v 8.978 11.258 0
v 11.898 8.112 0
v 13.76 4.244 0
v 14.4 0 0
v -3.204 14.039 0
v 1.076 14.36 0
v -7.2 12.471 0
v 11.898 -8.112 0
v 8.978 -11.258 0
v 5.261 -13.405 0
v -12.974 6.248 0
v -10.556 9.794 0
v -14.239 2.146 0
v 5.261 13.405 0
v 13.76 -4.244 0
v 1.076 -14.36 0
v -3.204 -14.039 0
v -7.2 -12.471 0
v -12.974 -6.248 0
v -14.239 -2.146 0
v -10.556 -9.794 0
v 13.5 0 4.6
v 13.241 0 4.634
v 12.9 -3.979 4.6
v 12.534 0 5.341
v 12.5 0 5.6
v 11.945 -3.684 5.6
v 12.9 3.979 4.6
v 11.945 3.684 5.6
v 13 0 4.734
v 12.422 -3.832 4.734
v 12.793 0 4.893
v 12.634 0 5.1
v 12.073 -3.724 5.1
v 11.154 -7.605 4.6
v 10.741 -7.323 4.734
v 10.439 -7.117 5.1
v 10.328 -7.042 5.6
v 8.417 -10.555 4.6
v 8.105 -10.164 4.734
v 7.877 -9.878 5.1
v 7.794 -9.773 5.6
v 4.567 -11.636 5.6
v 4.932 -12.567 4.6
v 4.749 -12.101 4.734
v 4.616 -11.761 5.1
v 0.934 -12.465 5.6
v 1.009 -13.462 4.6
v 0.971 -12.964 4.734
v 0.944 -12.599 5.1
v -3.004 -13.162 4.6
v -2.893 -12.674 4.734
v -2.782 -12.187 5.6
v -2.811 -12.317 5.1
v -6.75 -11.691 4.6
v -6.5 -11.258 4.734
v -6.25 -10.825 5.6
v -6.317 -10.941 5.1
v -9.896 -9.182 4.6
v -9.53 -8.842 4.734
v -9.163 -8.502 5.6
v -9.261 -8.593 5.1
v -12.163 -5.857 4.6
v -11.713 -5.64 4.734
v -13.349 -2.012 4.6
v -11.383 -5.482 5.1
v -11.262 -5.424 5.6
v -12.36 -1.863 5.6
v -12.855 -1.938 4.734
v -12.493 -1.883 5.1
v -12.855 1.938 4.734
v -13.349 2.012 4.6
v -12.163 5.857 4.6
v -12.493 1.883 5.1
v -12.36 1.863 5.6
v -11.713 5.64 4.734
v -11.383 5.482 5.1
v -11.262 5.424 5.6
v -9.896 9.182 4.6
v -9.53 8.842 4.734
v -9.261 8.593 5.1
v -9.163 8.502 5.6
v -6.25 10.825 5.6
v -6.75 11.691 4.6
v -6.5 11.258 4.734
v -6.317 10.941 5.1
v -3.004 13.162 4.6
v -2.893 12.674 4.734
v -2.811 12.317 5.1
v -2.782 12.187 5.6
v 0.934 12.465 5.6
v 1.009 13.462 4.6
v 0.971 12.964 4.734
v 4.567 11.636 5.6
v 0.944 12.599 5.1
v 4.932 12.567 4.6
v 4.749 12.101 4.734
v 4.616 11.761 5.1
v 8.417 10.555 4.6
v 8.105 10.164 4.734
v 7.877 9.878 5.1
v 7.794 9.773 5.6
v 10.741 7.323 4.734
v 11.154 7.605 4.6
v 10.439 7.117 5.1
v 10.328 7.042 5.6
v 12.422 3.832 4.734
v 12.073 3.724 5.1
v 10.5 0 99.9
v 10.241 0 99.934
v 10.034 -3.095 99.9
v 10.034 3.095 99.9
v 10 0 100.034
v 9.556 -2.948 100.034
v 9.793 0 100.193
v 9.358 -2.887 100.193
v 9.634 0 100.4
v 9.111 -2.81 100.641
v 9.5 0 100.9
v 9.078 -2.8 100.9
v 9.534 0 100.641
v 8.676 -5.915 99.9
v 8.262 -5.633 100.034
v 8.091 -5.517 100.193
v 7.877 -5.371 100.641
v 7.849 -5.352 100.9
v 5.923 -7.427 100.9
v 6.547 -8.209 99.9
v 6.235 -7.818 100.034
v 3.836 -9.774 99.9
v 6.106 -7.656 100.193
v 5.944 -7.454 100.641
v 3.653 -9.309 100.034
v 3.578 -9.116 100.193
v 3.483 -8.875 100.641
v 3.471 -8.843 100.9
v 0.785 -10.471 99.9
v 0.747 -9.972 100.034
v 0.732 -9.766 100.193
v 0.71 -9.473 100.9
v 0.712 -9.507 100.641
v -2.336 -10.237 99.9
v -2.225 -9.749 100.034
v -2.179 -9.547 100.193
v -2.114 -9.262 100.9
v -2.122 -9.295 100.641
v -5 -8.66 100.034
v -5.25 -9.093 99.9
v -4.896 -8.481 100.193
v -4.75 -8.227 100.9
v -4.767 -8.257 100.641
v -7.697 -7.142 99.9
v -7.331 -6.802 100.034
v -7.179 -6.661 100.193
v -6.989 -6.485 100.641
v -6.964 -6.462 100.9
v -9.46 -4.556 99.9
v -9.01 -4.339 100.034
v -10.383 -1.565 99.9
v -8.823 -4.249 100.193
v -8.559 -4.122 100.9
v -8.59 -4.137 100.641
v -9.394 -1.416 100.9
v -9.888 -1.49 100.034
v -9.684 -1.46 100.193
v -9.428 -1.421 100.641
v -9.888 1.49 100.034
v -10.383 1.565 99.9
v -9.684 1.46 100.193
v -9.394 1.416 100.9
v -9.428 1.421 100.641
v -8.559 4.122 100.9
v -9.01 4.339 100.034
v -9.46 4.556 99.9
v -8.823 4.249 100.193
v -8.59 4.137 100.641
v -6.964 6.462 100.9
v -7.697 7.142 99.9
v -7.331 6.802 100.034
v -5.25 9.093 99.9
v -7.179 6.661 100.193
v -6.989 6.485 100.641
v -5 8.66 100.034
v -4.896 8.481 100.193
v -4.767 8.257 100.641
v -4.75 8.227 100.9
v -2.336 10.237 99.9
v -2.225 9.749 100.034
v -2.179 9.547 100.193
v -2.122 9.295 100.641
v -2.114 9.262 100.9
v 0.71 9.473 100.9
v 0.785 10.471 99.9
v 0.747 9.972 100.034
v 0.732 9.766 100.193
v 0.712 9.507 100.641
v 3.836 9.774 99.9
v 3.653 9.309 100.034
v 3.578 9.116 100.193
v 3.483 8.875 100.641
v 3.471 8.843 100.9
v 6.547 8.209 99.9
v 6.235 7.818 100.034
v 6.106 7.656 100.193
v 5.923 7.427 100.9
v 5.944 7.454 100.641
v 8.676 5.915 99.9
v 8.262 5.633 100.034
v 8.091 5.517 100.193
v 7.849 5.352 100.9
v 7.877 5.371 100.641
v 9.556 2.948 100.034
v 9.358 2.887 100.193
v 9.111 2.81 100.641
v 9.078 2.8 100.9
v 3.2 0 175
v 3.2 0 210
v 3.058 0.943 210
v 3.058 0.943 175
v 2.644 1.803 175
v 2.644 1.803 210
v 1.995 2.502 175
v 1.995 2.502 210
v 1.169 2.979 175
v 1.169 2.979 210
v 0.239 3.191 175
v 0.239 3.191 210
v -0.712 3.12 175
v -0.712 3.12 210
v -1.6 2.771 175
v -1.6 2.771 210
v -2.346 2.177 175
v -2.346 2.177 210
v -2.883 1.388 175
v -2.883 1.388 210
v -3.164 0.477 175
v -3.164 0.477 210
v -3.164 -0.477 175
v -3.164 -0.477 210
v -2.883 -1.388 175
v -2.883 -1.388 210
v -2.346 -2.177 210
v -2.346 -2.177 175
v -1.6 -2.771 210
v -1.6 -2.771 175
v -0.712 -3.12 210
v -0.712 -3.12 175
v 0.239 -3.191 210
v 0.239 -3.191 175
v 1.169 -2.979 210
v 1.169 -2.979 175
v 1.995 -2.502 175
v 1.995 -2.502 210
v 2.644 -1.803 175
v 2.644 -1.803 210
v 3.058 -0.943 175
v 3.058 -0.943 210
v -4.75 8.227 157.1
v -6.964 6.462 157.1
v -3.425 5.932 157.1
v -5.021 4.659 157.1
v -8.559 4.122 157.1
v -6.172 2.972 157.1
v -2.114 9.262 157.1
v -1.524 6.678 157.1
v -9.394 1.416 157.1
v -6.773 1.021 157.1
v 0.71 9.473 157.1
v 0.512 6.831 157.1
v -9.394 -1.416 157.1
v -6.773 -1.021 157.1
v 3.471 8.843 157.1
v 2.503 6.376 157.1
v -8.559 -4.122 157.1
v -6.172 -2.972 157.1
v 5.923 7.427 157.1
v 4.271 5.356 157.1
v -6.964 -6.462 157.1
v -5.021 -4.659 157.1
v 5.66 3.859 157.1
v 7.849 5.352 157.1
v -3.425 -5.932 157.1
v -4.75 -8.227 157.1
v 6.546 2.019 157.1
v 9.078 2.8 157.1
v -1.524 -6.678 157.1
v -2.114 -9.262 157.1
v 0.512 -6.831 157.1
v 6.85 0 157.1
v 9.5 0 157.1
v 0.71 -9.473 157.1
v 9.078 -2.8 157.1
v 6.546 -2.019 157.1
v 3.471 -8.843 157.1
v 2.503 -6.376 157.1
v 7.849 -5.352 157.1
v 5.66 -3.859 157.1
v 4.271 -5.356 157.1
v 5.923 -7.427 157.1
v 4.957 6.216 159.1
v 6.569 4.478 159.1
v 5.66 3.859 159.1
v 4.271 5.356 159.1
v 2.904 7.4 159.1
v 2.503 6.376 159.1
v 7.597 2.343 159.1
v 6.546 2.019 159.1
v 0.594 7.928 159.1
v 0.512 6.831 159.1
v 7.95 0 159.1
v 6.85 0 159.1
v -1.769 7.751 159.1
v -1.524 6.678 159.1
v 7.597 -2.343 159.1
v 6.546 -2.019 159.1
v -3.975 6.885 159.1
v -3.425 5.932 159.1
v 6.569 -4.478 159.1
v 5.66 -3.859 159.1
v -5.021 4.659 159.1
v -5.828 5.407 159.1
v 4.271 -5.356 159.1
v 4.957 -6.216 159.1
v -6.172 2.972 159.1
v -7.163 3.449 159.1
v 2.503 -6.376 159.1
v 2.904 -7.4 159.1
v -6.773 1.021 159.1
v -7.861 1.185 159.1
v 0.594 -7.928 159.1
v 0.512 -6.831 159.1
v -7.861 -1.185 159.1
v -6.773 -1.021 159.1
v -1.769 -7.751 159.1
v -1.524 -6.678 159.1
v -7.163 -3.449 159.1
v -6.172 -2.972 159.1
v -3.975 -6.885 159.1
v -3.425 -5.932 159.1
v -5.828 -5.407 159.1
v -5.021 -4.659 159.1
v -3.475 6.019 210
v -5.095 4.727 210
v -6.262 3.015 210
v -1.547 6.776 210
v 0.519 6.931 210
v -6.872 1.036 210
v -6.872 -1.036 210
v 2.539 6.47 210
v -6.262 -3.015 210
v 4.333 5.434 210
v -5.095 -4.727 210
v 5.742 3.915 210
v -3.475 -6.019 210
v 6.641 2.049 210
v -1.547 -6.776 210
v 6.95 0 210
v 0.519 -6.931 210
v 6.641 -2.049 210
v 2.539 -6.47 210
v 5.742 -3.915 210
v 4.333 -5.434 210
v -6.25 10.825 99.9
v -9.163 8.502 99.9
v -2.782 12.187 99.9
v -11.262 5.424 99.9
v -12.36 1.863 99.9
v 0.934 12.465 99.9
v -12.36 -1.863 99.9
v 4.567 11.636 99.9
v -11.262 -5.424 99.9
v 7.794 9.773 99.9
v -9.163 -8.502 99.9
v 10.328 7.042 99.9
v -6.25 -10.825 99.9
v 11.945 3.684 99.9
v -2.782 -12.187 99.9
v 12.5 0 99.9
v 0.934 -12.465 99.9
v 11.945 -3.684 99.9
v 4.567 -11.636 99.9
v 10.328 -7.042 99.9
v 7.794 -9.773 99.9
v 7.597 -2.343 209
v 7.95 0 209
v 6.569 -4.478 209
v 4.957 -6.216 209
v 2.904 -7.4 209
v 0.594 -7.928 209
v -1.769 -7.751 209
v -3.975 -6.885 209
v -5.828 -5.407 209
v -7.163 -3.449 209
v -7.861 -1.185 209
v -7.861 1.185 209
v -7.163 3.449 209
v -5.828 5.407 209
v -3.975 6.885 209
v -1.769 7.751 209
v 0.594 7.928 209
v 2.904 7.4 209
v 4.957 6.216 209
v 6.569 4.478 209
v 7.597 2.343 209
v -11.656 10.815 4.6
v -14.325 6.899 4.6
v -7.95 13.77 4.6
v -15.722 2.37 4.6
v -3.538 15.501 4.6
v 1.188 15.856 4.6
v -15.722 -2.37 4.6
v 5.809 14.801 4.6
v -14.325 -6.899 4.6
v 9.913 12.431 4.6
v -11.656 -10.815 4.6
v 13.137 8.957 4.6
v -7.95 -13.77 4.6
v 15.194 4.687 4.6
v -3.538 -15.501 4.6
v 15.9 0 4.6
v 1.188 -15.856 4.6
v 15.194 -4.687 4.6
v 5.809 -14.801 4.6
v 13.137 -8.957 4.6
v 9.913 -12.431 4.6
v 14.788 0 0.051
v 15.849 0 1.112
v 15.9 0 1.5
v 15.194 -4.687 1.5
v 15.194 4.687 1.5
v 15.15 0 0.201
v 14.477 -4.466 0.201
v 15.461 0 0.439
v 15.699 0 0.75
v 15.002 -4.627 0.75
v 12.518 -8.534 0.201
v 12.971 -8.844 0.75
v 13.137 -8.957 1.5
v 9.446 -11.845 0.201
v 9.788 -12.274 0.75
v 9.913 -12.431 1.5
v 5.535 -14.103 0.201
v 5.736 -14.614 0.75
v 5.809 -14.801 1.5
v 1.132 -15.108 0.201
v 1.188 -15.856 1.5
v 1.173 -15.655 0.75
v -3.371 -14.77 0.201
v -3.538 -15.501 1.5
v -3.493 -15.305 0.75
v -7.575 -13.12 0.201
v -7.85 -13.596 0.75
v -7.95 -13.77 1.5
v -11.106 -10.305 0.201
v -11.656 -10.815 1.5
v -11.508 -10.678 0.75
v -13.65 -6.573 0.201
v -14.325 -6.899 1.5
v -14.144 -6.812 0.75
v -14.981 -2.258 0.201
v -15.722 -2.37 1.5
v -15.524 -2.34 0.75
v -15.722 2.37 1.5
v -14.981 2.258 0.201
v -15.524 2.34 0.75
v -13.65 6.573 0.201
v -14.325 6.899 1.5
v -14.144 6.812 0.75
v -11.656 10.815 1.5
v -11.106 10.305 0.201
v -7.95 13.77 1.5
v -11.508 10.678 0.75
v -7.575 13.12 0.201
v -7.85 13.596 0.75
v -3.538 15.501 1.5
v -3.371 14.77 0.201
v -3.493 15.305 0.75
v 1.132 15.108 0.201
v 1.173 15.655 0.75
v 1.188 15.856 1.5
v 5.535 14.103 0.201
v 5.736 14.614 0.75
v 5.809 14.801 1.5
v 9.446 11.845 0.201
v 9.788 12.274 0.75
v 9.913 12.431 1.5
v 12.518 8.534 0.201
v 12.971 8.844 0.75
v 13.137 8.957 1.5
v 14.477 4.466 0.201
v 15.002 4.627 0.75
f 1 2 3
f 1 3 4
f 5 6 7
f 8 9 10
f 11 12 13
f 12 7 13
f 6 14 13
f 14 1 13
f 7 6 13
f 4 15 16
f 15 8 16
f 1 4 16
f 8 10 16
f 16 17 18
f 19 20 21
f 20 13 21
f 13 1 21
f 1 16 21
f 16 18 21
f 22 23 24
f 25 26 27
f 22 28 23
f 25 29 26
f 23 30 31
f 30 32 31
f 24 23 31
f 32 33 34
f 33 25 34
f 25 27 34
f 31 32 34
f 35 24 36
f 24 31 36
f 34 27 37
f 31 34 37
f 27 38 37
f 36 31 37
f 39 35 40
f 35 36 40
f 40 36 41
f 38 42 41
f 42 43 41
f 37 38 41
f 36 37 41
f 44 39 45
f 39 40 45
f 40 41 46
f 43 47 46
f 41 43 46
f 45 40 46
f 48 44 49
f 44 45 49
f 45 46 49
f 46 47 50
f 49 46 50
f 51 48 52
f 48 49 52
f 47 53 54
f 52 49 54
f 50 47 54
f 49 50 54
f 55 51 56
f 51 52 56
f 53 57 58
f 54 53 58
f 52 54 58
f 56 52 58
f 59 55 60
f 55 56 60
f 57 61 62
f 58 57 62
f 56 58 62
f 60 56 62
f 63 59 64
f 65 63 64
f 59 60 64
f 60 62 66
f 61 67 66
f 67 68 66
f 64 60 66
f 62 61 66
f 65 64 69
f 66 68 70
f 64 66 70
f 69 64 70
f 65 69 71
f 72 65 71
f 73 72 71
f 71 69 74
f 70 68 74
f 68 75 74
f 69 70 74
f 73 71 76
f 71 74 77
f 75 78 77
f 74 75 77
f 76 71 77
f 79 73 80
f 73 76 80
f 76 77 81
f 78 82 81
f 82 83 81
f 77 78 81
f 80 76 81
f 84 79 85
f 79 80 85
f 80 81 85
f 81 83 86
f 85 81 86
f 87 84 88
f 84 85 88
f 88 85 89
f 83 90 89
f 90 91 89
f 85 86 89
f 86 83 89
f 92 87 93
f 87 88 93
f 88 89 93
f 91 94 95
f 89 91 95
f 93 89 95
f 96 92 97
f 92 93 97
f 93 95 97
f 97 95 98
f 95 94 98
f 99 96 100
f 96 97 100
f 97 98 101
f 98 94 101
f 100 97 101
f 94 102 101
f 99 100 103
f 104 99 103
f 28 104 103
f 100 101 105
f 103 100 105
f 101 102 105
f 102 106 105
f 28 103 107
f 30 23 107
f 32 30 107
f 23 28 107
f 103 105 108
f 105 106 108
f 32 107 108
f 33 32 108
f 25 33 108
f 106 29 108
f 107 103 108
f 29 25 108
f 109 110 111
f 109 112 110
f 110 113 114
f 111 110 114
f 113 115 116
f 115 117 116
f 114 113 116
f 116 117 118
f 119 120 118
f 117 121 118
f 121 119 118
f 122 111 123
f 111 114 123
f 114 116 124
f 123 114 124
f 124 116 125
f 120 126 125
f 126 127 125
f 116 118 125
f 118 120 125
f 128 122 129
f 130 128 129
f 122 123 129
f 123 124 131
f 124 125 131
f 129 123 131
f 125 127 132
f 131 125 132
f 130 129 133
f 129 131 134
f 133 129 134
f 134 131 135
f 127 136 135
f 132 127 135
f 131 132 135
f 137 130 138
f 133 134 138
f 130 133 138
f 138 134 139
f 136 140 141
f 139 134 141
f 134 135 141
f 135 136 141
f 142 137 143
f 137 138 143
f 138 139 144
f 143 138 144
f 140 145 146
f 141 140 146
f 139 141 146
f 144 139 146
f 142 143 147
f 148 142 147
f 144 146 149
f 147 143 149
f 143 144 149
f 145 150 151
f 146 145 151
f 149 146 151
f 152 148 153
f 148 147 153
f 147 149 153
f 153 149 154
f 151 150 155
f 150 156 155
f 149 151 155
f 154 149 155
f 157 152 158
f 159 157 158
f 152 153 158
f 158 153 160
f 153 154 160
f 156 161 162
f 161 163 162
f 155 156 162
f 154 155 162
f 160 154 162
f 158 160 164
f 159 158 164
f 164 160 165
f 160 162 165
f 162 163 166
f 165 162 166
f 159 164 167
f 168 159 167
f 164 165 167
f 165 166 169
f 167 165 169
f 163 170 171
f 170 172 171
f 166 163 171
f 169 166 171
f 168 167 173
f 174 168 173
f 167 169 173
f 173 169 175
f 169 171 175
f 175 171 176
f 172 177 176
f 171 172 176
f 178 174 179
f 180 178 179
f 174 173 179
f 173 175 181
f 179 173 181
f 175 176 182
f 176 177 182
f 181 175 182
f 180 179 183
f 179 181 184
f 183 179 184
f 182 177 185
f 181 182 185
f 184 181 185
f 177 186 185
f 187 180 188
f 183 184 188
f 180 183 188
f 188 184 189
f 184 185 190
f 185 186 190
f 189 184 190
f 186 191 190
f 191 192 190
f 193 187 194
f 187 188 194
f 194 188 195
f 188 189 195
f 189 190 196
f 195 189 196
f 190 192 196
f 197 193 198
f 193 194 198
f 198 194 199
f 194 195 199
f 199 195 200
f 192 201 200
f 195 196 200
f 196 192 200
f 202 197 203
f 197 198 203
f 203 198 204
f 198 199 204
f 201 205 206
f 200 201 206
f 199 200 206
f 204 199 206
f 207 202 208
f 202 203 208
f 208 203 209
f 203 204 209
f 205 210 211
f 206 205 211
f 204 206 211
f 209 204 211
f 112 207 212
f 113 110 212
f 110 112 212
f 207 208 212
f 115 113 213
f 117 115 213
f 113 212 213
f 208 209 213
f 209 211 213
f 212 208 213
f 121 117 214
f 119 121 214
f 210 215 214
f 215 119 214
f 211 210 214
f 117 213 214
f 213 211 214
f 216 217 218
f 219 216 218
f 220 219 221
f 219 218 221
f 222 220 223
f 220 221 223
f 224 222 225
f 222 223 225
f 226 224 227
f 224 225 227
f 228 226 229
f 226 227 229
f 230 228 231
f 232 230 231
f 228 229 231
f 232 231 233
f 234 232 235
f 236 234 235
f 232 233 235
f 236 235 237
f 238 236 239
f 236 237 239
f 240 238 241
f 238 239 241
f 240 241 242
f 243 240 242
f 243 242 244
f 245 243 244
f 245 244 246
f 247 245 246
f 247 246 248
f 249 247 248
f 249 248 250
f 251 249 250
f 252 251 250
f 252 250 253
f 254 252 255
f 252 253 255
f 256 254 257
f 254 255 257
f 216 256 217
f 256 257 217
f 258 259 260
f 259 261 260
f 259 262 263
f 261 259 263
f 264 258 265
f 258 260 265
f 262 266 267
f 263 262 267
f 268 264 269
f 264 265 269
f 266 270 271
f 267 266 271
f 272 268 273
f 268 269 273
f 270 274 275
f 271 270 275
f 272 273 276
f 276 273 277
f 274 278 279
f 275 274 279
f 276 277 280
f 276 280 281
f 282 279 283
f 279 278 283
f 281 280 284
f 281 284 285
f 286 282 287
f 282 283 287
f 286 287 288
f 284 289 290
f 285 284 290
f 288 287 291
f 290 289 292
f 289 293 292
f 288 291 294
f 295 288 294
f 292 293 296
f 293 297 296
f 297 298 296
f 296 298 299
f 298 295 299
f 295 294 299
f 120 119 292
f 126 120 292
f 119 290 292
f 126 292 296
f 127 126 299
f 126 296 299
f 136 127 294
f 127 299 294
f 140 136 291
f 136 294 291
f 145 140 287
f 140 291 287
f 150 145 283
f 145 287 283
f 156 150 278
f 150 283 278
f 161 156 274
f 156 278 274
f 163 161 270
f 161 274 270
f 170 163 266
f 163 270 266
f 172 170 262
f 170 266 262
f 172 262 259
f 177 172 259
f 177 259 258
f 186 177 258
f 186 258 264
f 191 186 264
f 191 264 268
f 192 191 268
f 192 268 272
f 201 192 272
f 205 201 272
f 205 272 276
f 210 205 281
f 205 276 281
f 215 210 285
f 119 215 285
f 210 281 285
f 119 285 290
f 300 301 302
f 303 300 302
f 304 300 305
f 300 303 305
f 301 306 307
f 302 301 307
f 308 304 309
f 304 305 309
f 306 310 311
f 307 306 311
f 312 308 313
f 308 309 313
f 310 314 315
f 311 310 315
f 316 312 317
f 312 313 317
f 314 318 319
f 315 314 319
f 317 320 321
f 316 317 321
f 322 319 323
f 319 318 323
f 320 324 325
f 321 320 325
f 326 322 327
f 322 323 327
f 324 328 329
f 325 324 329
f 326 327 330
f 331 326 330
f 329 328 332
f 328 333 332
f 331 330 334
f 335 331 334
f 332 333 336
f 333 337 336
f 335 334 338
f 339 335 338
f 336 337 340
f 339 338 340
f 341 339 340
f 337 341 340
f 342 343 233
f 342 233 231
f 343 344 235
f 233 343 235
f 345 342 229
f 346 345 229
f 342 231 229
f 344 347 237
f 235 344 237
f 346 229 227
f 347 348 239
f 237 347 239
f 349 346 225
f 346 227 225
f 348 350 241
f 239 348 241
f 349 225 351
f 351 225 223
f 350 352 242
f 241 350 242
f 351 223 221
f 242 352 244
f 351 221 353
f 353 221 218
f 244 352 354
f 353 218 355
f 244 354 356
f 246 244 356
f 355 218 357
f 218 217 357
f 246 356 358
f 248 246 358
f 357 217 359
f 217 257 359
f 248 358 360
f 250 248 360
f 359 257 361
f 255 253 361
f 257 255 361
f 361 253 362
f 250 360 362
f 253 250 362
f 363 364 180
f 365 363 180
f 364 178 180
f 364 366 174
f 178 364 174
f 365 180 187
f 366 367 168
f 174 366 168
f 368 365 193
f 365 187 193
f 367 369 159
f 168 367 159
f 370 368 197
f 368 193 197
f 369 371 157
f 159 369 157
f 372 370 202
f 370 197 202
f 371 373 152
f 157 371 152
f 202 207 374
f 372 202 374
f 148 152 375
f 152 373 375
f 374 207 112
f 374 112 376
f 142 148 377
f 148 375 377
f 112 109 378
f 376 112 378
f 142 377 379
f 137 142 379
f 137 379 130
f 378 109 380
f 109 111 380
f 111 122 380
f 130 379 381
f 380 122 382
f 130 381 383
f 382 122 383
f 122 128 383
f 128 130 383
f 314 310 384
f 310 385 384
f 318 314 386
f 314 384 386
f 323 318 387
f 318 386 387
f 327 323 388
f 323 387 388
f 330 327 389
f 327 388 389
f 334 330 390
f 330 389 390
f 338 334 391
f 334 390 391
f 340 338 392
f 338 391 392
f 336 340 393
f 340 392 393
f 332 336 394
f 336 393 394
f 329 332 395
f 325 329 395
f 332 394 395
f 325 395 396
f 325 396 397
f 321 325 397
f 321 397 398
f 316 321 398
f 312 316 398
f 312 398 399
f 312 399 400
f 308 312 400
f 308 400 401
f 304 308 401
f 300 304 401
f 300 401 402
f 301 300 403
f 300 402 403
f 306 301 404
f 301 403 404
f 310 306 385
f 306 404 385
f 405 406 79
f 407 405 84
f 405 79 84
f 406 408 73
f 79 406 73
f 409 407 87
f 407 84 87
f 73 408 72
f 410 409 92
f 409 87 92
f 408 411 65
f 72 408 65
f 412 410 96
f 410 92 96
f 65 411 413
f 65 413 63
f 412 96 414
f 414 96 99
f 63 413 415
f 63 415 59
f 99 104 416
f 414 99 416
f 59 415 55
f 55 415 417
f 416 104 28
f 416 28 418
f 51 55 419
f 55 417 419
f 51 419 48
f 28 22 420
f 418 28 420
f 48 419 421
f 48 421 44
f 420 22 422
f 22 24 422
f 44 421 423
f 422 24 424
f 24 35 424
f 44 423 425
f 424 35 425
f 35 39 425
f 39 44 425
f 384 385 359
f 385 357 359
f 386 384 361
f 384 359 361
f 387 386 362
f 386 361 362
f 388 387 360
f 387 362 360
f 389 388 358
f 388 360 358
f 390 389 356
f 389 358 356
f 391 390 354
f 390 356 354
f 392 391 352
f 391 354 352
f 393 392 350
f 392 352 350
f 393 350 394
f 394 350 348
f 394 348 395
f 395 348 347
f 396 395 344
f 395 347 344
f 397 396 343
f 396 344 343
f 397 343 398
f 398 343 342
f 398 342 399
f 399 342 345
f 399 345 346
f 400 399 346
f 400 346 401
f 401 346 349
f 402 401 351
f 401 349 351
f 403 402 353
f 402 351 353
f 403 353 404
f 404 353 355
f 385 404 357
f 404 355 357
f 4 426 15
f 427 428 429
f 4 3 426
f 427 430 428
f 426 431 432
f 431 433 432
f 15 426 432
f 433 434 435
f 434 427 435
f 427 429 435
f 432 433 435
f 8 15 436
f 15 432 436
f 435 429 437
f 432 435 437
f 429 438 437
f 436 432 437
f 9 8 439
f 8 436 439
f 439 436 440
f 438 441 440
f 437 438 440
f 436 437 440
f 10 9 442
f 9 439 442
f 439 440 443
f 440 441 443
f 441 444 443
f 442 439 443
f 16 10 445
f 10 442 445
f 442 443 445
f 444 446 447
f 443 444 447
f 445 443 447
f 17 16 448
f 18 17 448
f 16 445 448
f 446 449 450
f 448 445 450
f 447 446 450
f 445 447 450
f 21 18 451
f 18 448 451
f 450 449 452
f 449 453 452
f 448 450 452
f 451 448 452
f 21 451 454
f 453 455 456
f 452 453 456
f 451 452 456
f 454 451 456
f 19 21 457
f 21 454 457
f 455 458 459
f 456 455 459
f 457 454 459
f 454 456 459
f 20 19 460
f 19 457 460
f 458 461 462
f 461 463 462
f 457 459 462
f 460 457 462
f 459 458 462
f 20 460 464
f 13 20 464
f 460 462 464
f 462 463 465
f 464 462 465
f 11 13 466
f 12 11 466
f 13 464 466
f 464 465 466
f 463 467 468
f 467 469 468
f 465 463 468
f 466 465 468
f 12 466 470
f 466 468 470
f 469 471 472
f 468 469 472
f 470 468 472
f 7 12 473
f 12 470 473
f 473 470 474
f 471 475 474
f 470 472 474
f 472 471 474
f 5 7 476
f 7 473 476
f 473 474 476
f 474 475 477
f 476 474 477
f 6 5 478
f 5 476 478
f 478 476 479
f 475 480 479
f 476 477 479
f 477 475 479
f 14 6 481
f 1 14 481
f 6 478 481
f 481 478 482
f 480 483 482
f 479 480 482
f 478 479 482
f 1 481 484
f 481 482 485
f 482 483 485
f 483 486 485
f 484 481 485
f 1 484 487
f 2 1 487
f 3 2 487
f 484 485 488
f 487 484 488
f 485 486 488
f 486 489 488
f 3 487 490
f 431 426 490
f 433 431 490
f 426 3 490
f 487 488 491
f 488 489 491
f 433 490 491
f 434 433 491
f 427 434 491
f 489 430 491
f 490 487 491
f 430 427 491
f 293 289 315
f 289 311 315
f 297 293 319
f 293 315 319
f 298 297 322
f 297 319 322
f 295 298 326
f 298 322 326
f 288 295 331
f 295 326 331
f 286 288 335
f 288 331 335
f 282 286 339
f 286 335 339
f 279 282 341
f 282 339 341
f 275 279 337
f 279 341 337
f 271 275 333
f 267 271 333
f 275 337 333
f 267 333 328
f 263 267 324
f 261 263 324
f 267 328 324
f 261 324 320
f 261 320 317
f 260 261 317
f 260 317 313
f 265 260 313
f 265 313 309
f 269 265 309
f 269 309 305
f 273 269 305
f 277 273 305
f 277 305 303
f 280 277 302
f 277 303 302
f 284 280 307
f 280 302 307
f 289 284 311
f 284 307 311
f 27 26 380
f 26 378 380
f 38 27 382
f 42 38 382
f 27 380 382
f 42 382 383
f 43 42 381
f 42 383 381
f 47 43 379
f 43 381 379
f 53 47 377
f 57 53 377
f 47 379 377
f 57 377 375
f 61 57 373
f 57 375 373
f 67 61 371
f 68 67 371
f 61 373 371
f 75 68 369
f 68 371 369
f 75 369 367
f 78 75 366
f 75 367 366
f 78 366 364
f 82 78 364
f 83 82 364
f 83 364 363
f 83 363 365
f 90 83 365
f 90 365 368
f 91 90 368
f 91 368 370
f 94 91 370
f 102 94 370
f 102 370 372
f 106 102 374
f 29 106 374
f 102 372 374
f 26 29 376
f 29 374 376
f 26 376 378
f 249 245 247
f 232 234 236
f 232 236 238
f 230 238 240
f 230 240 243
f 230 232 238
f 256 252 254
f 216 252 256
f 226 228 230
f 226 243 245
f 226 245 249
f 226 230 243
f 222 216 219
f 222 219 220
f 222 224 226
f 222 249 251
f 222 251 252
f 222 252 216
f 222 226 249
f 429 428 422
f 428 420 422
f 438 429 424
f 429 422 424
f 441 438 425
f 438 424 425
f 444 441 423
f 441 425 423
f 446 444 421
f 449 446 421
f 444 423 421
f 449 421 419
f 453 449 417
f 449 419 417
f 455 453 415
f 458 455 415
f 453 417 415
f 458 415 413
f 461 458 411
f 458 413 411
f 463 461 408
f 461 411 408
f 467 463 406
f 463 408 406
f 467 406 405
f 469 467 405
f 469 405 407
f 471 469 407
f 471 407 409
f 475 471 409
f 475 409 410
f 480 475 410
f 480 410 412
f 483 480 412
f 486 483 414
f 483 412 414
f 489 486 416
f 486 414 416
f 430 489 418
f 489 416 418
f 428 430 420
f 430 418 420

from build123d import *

# Parameters (mm, degrees)
SKETCH3_R          = 3.2
CUT_EXTRUDE1_DEPTH = 35


with BuildPart() as part:
    # Sketch2 → Base-Revolve (revolve)
    with BuildSketch(Plane(origin=(0, 0, 0), x_dir=(0, 0, -1), z_dir=(1, 0, 0)), mode=Mode.PRIVATE) as base_revolve_sk:
        with BuildLine():
            Line((0, 0), (0, 14.4))
            ThreePointArc((0, 14.4), (-0.439339828, 15.460660172), (-1.5, 15.9))
            Line((-1.5, 15.9), (-4.6, 15.9))
            Line((-4.6, 15.9), (-4.6, 13.5))
            ThreePointArc((-4.6, 13.5), (-4.892893219, 12.792893219), (-5.6, 12.5))
            Line((-5.6, 12.5), (-99.9, 12.5))
            Line((-99.9, 12.5), (-99.9, 10.5))
            ThreePointArc((-99.9, 10.5), (-100.192893219, 9.792893219), (-100.9, 9.5))
            Line((-100.9, 9.5), (-157.1, 9.5))
            Line((-157.1, 9.5), (-157.1, 6.85))
            Line((-157.1, 6.85), (-159.1, 6.85))
            Line((-159.1, 6.85), (-159.1, 7.95))
            Line((-159.1, 7.95), (-209, 7.95))
            Line((-209, 7.95), (-210, 6.95))
            Line((-210, 6.95), (-210, 0))
            Line((-210, 0), (0, 0))
        make_face()
    revolve(base_revolve_sk.sketch.rotate(Axis((0, 0, 0), (0, 0, -1)), 90), axis=Axis((0, 0, 0), (0, 0, -1)))

    # Sketch3 → Cut-Extrude1 (cut)
    with BuildSketch(Plane.XY.offset(210)):
        Circle(SKETCH3_R)
    extrude(amount=-CUT_EXTRUDE1_DEPTH, mode=Mode.SUBTRACT)


solid = part.part
